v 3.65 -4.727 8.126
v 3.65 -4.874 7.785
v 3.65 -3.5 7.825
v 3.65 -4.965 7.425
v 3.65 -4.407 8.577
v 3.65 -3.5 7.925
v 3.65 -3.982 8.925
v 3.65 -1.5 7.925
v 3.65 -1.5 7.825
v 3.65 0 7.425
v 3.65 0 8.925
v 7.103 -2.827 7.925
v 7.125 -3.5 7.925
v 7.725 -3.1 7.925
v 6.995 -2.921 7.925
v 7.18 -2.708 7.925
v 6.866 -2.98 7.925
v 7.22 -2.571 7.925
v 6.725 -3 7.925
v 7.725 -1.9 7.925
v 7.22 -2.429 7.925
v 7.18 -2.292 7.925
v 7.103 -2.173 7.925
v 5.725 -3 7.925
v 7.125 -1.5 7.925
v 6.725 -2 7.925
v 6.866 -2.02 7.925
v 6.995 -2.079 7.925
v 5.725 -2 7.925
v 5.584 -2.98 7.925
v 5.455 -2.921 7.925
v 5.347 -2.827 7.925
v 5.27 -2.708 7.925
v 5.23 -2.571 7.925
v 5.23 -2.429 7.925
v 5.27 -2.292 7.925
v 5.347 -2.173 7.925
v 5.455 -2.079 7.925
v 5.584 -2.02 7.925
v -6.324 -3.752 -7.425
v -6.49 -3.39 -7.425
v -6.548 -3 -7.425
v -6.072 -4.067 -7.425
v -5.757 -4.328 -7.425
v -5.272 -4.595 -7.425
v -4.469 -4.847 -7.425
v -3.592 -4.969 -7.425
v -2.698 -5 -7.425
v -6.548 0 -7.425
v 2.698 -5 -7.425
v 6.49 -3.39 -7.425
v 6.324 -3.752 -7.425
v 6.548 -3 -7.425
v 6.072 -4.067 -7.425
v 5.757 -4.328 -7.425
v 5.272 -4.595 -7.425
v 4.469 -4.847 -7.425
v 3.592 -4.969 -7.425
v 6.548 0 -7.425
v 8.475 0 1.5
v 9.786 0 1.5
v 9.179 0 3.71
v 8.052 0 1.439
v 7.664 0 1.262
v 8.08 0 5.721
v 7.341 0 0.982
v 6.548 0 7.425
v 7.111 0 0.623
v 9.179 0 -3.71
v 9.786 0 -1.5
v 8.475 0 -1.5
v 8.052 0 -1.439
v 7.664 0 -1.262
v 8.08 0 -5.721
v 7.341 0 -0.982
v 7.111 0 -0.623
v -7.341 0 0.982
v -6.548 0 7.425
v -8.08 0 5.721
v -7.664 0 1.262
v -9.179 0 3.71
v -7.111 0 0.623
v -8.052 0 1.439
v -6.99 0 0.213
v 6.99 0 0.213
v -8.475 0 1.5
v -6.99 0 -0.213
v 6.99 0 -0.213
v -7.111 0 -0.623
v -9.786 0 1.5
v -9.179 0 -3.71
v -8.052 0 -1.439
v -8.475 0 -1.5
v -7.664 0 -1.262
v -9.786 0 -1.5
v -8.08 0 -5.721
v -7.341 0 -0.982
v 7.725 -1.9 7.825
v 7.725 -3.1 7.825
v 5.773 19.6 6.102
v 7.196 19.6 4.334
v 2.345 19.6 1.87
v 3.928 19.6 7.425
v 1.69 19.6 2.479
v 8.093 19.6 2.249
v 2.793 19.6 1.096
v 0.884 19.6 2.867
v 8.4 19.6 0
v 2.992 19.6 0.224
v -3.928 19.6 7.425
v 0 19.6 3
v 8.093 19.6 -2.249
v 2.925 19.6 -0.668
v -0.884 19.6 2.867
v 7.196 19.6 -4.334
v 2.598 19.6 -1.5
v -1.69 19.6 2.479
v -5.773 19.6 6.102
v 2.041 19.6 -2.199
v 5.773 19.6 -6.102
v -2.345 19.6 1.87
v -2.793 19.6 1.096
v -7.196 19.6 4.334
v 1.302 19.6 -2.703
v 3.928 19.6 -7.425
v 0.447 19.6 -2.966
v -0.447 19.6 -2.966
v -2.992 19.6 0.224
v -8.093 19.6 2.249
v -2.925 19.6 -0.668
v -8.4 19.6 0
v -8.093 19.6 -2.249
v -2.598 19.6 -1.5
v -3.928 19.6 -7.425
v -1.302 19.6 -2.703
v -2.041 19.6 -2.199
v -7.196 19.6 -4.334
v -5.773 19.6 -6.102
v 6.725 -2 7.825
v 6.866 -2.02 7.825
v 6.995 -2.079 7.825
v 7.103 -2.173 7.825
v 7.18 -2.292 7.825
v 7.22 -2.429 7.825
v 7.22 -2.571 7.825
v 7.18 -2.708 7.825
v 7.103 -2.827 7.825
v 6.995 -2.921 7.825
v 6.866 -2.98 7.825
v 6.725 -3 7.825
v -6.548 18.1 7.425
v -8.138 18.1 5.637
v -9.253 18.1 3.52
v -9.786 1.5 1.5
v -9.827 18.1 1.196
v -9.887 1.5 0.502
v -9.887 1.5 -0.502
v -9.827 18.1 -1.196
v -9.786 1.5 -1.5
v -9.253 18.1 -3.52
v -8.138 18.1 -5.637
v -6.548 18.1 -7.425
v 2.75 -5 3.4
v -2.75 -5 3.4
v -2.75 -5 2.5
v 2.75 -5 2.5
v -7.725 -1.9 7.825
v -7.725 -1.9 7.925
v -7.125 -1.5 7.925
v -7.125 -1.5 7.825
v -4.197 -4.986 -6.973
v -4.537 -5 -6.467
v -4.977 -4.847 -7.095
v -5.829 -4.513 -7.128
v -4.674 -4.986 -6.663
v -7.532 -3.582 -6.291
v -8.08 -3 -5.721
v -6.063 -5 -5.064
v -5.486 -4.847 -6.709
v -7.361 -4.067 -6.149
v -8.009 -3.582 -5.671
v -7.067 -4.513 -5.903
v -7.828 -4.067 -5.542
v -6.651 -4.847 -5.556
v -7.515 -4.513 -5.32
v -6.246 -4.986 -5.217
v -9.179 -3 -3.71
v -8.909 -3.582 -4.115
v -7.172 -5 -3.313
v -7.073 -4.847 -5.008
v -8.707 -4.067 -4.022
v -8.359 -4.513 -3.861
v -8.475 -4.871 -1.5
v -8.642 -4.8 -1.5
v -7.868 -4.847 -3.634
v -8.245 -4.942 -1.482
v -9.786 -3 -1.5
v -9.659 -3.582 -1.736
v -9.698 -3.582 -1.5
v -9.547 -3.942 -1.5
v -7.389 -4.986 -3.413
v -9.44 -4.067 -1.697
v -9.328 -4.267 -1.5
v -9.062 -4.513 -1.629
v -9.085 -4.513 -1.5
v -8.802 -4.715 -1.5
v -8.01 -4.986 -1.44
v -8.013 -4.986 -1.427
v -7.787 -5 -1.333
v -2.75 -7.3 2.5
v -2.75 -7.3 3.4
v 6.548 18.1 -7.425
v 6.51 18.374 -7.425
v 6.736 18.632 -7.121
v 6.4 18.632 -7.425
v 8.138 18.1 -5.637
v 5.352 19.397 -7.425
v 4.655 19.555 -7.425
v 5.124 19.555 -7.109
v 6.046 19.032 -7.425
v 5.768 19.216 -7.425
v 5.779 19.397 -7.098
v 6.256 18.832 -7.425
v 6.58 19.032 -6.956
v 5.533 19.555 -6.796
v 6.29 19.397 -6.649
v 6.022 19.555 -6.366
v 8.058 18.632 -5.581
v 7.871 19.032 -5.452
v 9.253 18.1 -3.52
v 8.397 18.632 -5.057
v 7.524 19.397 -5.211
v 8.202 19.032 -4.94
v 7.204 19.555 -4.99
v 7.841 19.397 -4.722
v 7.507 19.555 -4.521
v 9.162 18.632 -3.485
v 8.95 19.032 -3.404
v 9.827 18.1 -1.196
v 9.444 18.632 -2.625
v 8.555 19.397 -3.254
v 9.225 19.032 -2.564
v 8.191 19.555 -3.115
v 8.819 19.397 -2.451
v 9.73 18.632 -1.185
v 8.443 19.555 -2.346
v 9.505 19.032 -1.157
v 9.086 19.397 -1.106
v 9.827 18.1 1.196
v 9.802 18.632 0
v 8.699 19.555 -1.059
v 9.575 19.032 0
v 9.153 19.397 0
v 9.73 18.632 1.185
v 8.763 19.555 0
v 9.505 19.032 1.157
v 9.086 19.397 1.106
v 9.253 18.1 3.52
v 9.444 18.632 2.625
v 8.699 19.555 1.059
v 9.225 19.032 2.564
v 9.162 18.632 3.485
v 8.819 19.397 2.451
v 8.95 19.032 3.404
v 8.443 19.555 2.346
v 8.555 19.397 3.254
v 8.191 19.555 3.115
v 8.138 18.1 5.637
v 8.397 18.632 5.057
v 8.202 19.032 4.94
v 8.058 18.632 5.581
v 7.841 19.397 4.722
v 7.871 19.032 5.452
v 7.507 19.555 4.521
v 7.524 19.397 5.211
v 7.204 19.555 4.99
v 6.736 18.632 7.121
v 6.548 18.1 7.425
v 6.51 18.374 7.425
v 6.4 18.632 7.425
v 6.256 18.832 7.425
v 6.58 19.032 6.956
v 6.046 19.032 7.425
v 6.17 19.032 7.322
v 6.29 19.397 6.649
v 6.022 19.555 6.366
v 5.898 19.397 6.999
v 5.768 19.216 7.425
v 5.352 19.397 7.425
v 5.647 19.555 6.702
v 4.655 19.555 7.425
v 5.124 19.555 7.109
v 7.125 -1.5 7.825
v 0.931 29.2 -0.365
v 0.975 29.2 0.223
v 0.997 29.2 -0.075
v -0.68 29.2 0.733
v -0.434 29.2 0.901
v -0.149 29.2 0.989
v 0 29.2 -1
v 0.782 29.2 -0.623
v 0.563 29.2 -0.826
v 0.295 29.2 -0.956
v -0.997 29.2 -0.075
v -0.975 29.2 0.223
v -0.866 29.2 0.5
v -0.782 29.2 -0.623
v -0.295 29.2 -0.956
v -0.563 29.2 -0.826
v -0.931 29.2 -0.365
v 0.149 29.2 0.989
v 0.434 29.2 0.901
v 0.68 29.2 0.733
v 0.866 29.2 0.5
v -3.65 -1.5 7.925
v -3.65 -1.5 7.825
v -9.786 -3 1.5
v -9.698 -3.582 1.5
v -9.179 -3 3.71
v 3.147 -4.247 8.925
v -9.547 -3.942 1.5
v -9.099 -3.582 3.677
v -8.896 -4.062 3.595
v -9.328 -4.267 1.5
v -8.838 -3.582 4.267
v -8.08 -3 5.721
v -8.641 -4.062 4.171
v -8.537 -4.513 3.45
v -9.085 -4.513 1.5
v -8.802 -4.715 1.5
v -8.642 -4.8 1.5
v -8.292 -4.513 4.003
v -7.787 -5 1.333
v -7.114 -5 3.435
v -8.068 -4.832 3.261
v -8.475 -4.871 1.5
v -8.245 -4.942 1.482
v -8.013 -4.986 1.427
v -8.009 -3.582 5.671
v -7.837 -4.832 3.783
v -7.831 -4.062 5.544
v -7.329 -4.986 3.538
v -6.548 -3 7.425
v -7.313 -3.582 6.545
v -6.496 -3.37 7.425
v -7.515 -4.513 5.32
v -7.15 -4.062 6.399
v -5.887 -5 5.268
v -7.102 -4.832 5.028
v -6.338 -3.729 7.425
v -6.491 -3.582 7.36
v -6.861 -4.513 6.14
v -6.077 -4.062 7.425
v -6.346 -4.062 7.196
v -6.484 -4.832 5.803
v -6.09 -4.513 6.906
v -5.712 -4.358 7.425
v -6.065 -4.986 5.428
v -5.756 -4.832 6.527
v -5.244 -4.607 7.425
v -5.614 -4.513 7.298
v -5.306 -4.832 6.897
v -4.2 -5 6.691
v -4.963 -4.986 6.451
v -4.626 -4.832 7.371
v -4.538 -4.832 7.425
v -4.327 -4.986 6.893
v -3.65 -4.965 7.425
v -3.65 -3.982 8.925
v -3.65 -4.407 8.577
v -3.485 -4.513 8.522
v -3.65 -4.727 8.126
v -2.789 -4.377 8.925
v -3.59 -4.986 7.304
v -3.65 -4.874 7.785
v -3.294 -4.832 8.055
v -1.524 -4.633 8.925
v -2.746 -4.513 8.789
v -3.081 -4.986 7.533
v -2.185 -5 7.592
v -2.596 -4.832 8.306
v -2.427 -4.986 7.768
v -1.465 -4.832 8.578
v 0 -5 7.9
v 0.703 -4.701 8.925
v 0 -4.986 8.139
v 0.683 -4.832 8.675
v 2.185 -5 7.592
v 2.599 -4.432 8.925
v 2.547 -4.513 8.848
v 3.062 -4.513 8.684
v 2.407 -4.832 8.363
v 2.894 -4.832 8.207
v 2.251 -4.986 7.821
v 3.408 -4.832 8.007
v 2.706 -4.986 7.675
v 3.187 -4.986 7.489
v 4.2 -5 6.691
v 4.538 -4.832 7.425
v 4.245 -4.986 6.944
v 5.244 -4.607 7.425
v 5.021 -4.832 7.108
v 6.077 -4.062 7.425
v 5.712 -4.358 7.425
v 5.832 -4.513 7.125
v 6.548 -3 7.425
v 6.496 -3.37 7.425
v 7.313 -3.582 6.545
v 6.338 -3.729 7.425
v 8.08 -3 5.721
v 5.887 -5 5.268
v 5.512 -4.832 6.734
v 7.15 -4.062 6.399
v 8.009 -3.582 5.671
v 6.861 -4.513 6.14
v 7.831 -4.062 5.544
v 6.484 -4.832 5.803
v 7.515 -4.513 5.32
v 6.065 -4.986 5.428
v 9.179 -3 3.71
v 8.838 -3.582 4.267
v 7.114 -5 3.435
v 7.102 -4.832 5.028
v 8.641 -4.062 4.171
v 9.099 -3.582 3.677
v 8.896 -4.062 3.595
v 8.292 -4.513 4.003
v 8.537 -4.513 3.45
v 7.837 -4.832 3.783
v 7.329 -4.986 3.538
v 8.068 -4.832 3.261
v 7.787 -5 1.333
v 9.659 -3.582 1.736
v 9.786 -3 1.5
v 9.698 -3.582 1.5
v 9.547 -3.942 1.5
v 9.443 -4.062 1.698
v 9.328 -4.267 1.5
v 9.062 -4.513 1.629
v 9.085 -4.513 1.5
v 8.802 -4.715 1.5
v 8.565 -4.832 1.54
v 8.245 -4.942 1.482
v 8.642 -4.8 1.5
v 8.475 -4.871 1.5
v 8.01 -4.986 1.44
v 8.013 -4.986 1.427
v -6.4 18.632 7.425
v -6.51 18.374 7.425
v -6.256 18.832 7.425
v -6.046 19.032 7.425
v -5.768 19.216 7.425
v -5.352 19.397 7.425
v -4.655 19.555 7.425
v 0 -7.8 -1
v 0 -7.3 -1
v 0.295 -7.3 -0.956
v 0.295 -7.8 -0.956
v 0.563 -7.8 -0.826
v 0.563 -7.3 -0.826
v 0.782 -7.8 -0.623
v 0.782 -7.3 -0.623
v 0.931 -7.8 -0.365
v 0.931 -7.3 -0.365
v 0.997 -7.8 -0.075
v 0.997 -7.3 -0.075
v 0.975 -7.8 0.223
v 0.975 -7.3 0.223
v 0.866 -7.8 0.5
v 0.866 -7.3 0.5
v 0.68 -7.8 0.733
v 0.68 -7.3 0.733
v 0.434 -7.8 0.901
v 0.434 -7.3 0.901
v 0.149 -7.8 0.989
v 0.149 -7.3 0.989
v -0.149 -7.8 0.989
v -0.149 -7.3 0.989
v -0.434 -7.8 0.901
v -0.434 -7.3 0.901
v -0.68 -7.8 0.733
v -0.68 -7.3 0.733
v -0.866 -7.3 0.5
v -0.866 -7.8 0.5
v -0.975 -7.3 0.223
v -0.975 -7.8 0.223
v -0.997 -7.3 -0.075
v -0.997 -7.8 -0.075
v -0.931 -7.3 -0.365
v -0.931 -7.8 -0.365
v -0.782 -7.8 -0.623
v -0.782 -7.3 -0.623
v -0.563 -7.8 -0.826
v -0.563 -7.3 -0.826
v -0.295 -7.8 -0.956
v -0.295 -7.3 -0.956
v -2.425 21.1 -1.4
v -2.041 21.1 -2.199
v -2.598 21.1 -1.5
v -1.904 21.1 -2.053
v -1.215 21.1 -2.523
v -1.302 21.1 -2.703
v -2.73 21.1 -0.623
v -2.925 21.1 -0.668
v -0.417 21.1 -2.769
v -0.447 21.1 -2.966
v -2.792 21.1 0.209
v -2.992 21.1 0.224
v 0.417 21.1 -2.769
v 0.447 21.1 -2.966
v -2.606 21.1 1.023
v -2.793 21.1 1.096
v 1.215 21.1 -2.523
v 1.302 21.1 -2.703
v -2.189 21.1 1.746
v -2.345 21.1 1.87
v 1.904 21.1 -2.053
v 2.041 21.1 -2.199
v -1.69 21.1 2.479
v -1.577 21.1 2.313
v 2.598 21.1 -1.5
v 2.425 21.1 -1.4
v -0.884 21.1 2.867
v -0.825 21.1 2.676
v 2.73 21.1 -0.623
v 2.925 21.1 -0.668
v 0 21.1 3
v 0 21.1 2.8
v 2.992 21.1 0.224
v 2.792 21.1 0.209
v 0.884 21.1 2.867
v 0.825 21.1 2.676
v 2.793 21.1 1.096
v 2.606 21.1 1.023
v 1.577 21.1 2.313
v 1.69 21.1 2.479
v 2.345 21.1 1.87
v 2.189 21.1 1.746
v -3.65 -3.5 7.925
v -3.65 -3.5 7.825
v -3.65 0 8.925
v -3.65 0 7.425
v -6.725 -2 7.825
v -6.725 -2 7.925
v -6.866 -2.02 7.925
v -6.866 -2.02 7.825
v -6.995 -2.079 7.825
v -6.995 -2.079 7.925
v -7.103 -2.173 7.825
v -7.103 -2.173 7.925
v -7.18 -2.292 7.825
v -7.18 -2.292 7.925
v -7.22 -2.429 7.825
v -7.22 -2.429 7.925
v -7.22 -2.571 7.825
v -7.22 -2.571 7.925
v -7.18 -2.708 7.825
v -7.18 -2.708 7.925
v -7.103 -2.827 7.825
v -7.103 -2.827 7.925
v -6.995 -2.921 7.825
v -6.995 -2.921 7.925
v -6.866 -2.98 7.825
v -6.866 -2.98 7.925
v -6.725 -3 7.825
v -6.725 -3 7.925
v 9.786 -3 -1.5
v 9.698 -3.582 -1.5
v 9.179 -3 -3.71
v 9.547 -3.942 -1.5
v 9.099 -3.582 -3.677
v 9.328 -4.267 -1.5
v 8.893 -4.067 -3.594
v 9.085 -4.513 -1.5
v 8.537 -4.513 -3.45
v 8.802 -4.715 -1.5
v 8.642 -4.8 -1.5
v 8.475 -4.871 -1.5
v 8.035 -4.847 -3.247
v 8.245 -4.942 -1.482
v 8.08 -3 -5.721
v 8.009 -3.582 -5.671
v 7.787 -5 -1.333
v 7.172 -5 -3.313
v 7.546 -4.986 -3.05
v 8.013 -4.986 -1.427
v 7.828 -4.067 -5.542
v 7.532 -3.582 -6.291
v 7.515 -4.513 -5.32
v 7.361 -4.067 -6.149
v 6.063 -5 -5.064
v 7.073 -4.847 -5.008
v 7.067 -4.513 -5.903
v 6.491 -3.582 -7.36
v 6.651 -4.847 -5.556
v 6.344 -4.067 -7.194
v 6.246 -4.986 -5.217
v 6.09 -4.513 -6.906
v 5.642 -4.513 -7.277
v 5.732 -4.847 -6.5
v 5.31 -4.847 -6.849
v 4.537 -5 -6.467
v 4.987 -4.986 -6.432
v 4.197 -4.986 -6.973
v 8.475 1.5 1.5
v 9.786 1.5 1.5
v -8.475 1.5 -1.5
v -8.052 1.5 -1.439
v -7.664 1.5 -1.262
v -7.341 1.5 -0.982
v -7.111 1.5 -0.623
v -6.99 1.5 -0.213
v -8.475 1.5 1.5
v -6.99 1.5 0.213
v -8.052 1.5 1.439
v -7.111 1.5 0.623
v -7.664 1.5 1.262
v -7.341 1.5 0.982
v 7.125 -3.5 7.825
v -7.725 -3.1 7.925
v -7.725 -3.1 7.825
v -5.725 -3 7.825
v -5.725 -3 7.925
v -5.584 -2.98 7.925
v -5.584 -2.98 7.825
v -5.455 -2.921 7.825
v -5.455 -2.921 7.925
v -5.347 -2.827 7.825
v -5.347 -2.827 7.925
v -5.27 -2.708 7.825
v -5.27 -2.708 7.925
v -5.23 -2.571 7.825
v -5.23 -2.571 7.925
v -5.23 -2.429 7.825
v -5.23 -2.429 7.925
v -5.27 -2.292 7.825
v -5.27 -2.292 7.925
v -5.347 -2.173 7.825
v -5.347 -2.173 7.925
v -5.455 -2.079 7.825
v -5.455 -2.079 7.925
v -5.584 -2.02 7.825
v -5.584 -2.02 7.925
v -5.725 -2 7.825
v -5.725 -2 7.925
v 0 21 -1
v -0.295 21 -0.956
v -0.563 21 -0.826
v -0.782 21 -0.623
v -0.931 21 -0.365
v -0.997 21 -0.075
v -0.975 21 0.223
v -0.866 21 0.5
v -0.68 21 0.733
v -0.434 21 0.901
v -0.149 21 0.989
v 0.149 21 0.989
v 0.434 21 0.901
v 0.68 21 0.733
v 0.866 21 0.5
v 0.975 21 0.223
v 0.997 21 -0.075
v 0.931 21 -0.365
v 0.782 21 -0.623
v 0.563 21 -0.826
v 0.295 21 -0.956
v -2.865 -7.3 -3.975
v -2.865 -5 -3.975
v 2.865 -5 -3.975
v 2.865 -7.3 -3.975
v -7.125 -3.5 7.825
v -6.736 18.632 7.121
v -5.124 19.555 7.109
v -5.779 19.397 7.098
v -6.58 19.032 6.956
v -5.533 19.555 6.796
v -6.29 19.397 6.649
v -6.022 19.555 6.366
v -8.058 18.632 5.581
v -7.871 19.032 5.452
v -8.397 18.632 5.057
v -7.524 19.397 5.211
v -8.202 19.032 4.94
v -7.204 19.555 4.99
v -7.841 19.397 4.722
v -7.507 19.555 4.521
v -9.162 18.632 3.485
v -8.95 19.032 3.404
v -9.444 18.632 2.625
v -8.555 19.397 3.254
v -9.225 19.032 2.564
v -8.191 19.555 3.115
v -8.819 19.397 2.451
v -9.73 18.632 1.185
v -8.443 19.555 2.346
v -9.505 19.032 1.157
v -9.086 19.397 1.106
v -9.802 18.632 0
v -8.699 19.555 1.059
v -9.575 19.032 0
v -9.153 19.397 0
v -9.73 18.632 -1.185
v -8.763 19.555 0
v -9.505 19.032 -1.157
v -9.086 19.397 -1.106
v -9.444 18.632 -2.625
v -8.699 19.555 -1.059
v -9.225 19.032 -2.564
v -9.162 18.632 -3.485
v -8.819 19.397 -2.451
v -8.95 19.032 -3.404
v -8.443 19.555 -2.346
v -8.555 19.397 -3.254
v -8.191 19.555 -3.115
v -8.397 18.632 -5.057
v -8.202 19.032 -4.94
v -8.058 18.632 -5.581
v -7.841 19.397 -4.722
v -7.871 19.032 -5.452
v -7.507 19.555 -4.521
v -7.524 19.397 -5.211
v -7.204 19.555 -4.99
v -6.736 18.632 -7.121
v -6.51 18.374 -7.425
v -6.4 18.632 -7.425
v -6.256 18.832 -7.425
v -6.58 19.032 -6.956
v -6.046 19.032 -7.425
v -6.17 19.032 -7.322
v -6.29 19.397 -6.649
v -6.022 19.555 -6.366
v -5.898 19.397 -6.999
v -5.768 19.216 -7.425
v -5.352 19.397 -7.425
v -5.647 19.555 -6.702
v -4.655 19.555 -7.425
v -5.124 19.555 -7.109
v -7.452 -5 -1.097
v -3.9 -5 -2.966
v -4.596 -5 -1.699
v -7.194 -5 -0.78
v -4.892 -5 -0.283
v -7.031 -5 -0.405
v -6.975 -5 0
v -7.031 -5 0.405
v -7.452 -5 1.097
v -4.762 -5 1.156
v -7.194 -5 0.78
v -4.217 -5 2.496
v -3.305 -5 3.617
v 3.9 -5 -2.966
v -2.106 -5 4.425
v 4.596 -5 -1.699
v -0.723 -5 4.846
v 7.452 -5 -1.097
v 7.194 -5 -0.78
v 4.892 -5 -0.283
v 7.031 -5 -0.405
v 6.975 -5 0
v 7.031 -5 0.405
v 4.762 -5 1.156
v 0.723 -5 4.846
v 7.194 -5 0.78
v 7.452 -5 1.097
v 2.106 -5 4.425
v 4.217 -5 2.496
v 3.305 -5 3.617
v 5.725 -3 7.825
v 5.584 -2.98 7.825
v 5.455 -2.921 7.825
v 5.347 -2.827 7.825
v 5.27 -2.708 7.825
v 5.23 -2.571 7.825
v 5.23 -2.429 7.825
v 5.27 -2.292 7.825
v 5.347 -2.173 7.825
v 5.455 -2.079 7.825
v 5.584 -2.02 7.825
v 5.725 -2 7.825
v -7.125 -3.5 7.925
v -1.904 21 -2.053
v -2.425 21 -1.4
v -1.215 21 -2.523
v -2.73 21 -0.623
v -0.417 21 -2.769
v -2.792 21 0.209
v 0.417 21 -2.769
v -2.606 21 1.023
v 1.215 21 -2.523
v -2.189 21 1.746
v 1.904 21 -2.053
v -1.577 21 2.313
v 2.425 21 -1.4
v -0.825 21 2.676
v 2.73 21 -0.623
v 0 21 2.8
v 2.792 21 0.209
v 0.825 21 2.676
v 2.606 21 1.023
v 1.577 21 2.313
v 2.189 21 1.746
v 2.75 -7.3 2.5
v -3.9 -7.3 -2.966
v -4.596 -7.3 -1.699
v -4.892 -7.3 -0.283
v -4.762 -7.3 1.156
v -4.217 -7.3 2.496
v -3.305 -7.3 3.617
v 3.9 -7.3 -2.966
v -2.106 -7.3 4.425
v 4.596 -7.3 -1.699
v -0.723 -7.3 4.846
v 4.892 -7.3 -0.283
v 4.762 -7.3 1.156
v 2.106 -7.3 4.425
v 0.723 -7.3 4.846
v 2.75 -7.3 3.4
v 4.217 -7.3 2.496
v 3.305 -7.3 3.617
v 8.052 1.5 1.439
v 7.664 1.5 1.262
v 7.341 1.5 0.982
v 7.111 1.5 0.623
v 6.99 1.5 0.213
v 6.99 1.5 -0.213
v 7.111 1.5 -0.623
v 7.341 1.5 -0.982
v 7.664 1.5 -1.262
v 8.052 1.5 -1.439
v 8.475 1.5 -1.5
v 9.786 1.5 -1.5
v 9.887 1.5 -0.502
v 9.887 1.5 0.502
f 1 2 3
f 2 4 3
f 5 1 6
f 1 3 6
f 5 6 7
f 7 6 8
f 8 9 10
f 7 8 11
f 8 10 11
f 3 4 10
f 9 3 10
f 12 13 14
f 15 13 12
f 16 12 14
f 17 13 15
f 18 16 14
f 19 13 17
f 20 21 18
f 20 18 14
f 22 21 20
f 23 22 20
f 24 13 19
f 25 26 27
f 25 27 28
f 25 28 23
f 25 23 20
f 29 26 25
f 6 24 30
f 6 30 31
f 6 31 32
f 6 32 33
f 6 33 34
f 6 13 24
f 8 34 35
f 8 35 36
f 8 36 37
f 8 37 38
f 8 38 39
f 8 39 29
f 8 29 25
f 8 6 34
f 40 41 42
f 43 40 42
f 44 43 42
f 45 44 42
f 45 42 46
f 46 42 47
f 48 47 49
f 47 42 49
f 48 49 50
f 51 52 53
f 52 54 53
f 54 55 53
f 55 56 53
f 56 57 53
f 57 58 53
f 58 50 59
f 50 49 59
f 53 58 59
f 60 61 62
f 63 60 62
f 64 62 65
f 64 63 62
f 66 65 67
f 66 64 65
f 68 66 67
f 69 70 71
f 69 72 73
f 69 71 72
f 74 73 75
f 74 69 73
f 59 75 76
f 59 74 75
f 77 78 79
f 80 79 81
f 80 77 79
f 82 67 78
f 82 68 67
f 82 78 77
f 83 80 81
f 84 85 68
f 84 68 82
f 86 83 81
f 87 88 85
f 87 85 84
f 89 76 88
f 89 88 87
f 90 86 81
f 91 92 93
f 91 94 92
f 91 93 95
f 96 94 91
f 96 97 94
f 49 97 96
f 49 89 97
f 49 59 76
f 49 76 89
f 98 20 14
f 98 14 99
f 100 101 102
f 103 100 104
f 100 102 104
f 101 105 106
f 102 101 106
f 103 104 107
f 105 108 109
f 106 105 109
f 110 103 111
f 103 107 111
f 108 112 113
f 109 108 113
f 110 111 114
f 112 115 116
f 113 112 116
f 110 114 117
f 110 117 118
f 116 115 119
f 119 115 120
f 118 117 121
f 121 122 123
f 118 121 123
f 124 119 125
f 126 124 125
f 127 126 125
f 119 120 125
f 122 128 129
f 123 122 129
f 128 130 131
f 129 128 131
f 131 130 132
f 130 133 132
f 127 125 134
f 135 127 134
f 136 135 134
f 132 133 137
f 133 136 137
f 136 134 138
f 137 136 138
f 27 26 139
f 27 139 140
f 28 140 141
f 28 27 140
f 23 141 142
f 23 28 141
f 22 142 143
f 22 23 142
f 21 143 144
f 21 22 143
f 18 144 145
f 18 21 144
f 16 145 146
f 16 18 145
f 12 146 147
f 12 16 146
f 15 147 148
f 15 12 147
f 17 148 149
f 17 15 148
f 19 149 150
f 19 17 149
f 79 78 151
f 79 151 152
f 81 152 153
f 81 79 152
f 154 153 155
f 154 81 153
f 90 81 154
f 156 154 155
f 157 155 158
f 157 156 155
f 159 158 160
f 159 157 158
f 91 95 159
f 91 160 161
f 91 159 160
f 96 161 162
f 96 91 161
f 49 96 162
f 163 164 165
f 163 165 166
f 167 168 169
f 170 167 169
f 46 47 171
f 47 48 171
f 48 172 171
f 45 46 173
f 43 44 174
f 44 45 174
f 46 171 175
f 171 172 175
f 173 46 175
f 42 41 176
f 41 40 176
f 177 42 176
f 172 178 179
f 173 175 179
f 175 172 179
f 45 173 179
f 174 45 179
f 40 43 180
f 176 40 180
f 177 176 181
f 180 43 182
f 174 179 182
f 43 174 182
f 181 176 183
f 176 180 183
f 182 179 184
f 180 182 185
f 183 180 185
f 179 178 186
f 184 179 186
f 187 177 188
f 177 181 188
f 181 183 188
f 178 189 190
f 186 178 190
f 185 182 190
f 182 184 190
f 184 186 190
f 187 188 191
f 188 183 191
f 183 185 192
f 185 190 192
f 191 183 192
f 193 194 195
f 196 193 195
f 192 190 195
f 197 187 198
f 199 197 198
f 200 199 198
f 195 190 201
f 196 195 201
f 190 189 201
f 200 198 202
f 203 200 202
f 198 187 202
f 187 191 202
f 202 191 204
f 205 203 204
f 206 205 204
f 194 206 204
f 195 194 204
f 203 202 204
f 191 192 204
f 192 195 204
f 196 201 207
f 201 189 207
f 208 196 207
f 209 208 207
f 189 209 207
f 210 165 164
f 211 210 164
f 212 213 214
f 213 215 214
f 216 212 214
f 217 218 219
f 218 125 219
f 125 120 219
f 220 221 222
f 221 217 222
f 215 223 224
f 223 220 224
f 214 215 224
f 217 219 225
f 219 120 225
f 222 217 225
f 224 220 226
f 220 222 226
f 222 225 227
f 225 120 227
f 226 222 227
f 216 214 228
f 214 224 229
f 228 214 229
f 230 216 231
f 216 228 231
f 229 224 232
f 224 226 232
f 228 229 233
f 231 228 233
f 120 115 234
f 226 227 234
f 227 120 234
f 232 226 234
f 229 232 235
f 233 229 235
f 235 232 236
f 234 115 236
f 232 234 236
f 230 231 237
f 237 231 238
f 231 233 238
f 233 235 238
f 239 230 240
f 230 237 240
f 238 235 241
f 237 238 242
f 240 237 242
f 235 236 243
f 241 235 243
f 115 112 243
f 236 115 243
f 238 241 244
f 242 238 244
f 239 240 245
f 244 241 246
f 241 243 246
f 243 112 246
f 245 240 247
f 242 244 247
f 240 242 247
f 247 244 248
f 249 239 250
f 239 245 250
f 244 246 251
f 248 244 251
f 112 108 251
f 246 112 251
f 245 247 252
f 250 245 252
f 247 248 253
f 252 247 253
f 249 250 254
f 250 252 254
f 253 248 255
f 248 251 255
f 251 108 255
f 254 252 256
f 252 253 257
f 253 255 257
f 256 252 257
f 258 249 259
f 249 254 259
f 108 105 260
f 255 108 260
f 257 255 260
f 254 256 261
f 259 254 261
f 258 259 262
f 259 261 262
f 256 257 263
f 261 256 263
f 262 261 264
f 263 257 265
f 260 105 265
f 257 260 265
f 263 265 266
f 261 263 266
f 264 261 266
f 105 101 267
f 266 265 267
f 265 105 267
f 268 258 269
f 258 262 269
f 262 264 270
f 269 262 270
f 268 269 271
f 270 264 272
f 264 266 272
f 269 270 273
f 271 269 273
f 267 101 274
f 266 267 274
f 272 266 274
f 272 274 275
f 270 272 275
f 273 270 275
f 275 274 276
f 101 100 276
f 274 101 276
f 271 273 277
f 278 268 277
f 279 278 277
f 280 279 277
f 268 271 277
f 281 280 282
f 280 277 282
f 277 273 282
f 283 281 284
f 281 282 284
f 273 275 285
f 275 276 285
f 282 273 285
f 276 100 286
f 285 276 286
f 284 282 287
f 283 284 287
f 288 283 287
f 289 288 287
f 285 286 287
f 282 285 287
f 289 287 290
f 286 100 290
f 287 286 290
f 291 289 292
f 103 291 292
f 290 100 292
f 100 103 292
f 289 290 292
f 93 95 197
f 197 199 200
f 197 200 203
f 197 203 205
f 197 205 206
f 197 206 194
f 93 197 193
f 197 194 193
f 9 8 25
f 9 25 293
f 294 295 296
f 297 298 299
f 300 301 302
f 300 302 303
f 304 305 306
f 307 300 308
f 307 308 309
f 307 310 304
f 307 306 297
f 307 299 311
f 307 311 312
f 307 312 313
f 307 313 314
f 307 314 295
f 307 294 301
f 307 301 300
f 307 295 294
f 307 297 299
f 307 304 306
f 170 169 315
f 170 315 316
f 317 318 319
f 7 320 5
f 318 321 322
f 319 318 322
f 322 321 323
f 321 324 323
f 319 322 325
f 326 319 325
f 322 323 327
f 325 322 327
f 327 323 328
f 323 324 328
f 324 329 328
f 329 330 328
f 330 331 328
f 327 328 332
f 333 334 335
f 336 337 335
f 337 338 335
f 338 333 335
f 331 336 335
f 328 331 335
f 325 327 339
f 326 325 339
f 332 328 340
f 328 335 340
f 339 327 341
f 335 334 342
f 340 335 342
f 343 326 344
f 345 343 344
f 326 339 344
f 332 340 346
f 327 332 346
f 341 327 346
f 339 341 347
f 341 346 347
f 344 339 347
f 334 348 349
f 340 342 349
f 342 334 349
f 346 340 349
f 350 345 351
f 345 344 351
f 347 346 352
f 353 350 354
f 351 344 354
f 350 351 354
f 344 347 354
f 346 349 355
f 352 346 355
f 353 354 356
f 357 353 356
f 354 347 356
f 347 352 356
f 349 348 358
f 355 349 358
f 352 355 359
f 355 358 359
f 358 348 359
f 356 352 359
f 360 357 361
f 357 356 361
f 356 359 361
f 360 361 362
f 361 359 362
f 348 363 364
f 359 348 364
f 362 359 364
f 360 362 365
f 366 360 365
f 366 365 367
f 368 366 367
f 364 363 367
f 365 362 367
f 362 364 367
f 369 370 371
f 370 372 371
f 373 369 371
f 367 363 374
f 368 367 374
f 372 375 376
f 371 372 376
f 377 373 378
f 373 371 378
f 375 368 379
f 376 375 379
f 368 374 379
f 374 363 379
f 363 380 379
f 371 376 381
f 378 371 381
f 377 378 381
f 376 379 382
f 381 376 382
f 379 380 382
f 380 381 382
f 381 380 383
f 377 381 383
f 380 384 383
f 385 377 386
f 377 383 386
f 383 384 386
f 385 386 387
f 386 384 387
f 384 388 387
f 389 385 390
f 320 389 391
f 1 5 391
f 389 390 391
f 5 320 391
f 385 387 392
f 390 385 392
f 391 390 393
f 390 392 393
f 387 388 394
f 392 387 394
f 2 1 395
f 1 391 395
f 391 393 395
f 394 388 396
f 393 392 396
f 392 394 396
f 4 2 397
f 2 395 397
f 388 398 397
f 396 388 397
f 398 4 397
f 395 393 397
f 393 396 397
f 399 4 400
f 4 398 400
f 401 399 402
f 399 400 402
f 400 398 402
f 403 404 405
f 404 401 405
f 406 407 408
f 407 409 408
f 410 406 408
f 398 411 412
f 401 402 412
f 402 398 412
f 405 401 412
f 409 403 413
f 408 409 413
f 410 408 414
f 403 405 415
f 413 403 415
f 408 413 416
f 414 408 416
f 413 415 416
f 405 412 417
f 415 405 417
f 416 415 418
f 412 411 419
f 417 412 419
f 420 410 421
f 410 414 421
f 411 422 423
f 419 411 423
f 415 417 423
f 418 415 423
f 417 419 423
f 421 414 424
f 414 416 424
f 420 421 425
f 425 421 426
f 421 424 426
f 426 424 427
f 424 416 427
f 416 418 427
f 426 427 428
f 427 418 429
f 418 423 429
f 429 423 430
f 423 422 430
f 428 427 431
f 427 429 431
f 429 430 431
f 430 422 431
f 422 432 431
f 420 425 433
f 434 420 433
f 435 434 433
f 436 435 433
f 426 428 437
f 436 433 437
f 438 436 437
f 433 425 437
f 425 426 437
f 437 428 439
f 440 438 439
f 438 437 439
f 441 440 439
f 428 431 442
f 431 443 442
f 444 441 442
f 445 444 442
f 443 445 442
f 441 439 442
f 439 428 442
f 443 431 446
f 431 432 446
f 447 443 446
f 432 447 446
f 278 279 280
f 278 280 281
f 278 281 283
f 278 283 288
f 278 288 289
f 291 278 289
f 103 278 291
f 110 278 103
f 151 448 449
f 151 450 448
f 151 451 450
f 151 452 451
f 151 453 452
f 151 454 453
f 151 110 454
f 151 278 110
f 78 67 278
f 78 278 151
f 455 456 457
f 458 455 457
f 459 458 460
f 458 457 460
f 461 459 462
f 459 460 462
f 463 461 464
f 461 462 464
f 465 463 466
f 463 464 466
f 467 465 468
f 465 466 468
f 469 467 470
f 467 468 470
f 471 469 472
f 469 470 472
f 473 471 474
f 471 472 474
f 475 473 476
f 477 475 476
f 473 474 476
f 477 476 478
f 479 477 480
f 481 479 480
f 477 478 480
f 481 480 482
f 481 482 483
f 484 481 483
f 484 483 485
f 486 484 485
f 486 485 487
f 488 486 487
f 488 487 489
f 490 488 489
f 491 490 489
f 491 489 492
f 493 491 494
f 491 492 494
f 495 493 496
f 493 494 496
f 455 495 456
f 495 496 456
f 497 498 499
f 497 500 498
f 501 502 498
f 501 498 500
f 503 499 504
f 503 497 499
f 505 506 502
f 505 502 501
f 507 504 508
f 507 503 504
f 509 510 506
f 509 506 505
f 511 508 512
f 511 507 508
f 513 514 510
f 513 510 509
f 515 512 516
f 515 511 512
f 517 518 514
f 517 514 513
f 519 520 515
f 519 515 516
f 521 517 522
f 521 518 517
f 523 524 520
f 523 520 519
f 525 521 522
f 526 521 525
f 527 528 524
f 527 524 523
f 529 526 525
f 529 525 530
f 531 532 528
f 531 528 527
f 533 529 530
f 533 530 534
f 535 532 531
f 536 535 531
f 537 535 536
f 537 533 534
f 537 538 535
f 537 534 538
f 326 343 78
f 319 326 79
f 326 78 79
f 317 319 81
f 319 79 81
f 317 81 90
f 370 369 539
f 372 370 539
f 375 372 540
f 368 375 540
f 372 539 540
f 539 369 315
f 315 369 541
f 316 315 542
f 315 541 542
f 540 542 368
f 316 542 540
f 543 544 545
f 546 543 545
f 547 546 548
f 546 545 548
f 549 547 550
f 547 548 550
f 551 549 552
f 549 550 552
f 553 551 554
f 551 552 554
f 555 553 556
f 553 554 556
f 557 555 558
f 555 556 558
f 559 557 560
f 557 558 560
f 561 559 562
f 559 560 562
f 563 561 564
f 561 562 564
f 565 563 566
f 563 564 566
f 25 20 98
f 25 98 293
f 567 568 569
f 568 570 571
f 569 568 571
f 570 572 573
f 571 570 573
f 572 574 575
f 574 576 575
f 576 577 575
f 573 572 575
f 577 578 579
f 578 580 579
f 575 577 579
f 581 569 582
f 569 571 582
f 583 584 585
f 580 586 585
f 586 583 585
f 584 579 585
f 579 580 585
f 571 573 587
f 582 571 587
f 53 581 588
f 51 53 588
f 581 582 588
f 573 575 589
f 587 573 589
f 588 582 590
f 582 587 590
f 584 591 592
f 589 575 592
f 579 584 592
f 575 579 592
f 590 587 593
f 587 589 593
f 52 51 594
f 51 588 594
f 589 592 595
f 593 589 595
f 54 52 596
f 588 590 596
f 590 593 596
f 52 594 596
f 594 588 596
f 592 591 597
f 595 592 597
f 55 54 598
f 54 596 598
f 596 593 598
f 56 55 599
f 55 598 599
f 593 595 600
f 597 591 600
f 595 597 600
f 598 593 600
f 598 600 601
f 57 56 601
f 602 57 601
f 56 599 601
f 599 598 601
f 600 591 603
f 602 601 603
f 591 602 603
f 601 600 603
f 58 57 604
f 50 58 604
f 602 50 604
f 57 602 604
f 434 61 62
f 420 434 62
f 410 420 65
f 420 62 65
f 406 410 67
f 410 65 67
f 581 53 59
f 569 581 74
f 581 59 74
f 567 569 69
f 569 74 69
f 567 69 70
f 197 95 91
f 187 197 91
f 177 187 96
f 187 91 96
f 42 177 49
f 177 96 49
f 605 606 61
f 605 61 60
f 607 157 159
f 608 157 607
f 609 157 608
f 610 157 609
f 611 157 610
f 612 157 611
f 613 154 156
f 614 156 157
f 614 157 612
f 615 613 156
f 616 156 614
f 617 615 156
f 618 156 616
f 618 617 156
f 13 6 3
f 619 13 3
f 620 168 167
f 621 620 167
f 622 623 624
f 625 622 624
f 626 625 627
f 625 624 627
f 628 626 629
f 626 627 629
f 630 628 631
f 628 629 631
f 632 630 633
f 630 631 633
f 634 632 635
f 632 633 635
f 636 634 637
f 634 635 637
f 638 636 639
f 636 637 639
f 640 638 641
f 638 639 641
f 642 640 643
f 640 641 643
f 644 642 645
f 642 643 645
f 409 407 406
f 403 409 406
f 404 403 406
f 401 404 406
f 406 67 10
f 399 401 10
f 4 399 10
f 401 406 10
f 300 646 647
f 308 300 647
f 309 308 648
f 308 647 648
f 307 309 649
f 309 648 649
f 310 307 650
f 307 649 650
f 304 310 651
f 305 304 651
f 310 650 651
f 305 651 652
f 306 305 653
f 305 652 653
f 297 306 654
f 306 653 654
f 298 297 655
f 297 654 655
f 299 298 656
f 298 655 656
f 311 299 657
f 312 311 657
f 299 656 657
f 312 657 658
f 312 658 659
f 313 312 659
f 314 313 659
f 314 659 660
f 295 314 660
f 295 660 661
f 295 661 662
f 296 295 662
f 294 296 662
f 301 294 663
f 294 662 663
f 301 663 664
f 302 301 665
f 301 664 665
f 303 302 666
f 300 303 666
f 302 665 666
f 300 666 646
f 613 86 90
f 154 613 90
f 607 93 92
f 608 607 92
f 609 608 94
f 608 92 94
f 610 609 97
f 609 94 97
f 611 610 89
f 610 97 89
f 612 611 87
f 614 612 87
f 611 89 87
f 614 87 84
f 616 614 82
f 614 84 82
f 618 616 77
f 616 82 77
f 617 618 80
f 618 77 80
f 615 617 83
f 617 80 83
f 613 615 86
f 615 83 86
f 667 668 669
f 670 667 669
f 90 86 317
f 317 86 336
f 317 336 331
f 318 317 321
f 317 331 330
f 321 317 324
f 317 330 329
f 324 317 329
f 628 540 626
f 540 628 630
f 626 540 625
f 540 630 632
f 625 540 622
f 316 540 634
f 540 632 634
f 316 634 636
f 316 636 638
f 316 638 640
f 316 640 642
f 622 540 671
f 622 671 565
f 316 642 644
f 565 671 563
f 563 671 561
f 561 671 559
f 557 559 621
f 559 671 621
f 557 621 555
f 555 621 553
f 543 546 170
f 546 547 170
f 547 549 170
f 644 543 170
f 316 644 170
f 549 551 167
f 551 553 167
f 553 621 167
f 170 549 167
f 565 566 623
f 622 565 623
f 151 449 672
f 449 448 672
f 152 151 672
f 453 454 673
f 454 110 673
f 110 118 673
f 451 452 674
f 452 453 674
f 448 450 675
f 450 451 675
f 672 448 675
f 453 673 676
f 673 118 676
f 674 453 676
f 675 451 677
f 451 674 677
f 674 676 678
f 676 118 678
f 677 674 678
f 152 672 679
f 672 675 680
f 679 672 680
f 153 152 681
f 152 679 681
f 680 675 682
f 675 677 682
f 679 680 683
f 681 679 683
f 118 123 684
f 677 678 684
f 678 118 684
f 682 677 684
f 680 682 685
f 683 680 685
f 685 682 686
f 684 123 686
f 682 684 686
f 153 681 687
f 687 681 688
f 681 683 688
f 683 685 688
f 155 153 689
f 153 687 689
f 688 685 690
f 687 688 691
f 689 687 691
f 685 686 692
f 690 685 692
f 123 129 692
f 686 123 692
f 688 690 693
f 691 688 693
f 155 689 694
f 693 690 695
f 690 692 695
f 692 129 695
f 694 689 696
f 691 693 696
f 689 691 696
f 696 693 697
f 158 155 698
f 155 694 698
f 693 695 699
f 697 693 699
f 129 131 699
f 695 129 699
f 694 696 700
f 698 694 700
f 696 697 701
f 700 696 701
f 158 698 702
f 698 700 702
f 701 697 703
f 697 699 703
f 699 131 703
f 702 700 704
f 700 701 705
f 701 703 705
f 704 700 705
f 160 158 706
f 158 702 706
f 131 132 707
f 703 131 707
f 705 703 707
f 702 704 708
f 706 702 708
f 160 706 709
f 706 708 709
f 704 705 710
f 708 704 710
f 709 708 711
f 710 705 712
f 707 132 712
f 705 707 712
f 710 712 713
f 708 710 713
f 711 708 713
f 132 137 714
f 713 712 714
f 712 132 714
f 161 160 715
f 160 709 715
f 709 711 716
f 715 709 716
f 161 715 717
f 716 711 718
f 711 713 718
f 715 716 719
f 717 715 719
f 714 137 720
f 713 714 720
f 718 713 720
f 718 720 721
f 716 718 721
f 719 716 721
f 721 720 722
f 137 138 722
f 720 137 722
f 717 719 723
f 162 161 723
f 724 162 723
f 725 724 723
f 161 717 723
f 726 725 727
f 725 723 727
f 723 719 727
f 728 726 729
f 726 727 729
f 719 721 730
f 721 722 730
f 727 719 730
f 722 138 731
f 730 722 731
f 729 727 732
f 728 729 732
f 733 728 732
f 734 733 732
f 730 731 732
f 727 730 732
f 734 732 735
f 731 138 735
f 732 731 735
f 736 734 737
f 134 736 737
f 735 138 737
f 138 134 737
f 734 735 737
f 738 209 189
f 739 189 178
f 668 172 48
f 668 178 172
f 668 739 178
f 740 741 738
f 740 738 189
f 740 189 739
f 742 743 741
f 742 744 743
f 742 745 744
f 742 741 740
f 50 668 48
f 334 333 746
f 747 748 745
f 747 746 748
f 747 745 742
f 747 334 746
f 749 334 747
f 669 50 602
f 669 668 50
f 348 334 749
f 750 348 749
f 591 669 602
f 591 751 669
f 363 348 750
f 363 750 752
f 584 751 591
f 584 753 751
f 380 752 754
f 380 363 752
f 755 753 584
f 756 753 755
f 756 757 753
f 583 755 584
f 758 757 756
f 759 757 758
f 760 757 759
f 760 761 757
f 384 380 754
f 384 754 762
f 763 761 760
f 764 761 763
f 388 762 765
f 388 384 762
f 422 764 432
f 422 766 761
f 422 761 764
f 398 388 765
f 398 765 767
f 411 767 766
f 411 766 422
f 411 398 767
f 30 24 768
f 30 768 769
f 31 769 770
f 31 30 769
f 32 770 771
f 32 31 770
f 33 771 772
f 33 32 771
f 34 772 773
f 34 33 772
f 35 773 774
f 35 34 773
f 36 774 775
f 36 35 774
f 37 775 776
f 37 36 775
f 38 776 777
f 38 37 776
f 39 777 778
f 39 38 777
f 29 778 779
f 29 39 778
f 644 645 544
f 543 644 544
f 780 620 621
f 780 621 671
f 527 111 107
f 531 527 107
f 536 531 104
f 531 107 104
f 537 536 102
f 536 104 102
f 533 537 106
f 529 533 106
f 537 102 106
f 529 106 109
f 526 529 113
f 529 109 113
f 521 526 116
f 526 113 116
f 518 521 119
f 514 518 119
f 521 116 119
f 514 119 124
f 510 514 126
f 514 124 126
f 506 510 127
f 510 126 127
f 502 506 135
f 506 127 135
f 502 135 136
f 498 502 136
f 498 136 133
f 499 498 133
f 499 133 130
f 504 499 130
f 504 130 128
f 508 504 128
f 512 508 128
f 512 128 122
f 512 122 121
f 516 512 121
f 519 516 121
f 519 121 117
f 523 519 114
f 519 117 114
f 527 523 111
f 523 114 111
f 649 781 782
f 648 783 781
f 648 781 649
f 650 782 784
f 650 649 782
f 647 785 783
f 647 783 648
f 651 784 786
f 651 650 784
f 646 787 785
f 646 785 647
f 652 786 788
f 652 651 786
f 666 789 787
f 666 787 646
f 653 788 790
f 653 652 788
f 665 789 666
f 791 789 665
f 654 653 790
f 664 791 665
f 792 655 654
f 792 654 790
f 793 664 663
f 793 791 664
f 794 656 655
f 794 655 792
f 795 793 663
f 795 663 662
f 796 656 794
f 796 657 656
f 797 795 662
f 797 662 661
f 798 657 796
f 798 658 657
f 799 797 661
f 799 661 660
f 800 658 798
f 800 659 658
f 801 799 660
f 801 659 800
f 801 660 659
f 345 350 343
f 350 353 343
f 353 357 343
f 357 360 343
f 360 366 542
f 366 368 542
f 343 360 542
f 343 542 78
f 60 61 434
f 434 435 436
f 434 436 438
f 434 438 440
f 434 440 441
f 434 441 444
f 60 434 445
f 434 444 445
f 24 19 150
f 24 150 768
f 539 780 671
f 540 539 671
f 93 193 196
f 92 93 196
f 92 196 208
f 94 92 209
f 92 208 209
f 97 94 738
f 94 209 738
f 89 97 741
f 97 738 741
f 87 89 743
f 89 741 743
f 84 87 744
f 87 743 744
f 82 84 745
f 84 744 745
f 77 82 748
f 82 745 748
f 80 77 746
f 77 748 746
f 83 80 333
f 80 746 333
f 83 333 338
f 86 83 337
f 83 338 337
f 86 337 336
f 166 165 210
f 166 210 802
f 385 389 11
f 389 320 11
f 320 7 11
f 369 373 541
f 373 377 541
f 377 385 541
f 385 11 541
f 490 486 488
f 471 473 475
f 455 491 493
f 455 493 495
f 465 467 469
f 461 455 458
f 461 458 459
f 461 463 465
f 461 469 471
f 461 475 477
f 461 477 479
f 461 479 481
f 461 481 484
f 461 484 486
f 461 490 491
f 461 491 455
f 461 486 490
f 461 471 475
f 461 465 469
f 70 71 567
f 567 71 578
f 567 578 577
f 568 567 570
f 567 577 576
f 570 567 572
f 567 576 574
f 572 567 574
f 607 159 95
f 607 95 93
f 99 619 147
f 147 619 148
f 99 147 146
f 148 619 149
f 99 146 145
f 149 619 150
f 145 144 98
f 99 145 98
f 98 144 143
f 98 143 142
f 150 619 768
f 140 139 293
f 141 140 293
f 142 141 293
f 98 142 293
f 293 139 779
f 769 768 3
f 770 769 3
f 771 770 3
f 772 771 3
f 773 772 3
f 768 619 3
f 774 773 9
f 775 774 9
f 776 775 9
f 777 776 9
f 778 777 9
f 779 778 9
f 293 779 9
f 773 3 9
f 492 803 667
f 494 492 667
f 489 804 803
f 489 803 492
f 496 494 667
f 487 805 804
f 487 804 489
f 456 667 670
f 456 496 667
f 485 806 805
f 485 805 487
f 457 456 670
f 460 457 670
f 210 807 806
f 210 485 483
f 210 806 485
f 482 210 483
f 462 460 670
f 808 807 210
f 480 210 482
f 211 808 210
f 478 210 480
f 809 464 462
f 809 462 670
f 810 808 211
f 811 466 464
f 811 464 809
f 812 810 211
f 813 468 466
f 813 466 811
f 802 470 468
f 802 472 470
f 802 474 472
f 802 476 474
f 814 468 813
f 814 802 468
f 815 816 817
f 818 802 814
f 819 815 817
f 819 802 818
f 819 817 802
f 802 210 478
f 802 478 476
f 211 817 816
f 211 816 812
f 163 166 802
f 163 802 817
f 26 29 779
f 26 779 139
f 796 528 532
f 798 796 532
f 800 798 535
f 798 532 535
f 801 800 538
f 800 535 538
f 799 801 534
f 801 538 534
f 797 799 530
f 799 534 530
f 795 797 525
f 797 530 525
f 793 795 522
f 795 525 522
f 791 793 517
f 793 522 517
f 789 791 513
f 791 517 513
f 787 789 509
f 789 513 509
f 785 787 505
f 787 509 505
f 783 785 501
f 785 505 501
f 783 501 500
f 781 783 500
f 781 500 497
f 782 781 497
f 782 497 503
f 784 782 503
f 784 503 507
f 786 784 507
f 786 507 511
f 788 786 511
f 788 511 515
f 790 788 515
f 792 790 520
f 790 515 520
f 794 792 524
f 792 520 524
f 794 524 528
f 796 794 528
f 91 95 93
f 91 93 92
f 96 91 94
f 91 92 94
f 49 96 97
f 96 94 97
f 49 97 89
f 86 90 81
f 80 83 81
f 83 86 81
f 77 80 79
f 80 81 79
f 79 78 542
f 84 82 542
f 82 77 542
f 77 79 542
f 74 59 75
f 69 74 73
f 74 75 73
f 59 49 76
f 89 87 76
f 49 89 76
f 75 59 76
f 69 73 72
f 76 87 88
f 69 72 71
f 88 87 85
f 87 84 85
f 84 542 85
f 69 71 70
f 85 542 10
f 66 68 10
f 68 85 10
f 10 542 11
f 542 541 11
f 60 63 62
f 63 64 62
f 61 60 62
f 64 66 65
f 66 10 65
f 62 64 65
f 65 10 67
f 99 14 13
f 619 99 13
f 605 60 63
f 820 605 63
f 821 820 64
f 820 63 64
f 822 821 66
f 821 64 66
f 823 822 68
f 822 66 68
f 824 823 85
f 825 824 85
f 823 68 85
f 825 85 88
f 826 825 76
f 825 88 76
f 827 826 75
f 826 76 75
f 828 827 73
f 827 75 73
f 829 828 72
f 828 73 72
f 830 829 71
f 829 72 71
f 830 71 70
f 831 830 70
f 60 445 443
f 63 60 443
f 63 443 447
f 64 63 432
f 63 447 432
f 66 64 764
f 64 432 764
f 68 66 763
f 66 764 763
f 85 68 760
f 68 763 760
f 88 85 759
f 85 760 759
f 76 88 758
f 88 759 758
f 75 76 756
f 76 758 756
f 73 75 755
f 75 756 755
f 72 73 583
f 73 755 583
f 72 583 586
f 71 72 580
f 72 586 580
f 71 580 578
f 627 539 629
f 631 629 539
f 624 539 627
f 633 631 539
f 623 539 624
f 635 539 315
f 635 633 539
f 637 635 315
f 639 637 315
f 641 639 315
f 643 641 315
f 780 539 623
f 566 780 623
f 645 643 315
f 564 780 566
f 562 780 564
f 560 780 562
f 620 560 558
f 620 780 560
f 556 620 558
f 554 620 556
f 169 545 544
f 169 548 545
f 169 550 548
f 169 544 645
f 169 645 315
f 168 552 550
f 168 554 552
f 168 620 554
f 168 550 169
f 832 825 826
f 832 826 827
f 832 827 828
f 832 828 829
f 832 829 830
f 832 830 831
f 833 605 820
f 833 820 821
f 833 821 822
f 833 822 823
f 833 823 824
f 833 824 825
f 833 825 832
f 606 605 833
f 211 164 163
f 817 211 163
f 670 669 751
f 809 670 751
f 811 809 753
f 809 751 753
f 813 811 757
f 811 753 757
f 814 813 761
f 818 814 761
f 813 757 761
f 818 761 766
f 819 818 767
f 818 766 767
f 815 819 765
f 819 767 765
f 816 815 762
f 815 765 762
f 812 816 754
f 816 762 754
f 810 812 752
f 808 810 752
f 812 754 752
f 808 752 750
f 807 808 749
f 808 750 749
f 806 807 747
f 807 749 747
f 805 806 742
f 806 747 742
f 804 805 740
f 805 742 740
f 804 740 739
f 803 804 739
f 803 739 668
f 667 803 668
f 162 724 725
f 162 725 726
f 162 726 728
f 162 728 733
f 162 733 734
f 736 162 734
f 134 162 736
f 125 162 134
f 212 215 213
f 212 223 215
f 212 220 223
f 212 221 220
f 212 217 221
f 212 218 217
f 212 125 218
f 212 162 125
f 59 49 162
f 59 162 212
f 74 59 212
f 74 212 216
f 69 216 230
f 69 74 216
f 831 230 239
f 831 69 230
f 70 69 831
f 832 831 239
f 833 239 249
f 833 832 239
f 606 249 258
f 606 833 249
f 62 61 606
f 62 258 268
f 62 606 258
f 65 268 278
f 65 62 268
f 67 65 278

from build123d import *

# Parameters (mm, degrees)
BOSS_EXTRUDE1_DEPTH      = 19.6
BOSS_EXTRUDE2_DEPTH      = 5
SKETCH3_W                = 5.5
SKETCH3_H                = 0.9
BOSS_EXTRUDE3_DEPTH      = 2.3
SKETCH4_R                = 1
BOSS_EXTRUDE4_DEPTH      = 0.5
CUT_EXTRUDE1_DEPTH       = 6.5
BOSS_EXTRUDE5_DEPTH      = 7.725
BOSS_EXTRUDE5_DEPTH_BACK = 7.725
SKETCH7_W                = 0.1
SKETCH7_H                = 2
CUT_EXTRUDE2_DEPTH       = 0.1
SKETCH9_R                = 3
BOSS_EXTRUDE6_DEPTH      = 1.5
SKETCH10_R               = 2.8
CUT_EXTRUDE3_DEPTH       = 0.1
SKETCH11_R               = 1
BOSS_EXTRUDE7_DEPTH      = 8.2
FILLET2_R                = 1.5


with BuildPart() as part:
    # Sketch1 → Boss-Extrude1 (new body)
    with BuildSketch(Plane(origin=(0, 0, 0), x_dir=(1, 0, 0), z_dir=(0, 1, 0))):
        with BuildLine():
            Line((-6.548234495, 7.425), (6.548234495, 7.425))
            ThreePointArc((6.548234495, 7.425), (9.9, 0), (6.548234495, -7.425))
            Line((6.548234495, -7.425), (-6.548234495, -7.425))
            ThreePointArc((-6.548234495, -7.425), (-9.9, 0), (-6.548234495, 7.425))
        make_face()
    extrude(amount=BOSS_EXTRUDE1_DEPTH)


with BuildPart() as body_2:
    # Sketch2 → Boss-Extrude2 (new body)
    with BuildSketch(Plane.XZ):
        with BuildLine():
            Line((-6.548234495, -7.425), (6.548234495, -7.425))
            ThreePointArc((6.548234495, -7.425), (9.9, 0), (6.548234495, 7.425))
            Line((6.548234495, 7.425), (3.65, 7.425))
            Line((3.65, 7.425), (3.65, 8.925))
            Line((3.65, 8.925), (-3.65, 8.925))
            Line((-3.65, 8.925), (-3.65, 7.425))
            Line((-3.65, 7.425), (-6.548234495, 7.425))
            ThreePointArc((-6.548234495, 7.425), (-9.9, 0), (-6.548234495, -7.425))
        make_face()
    extrude(amount=BOSS_EXTRUDE2_DEPTH)

    # Sketch3 → Boss-Extrude3 (add)
    with BuildSketch(Plane.XZ.offset(5)):
        with BuildLine():
            Line((-2.865200691, -3.975), (2.865200691, -3.975))
            ThreePointArc((2.865200691, -3.975), (0, 4.9), (-2.865200691, -3.975))
        make_face()
        with Locations((0, 2.95)):
            Rectangle(SKETCH3_W, SKETCH3_H, mode=Mode.SUBTRACT)
    extrude(amount=BOSS_EXTRUDE3_DEPTH)

    # Sketch4 → Boss-Extrude4 (add)
    with BuildSketch(Plane.XZ.offset(7.3)):
        with Locations(Location((0, 0, 0), (0, 0, 270))):
            Circle(SKETCH4_R)
    extrude(amount=BOSS_EXTRUDE4_DEPTH)


with BuildPart() as cut_extrude1_tool:
    # Sketch5 → Cut-Extrude1 (new body)
    with BuildSketch(Plane.XZ.offset(5)):
        with BuildLine():
            ThreePointArc((-8.475, -1.5), (-6.975, 0), (-8.475, 1.5))
            Line((-8.475, 1.5), (-9.785703858, 1.5))
            ThreePointArc((-9.785703858, 1.5), (-9.9, 0), (-9.785703858, -1.5))
            Line((-9.785703858, -1.5), (-8.475, -1.5))
        make_face()
        with BuildLine():
            Line((9.785703858, 1.5), (8.475, 1.5))
            ThreePointArc((8.475, 1.5), (6.975, 0), (8.475, -1.5))
            Line((8.475, -1.5), (9.785703858, -1.5))
            ThreePointArc((9.785703858, -1.5), (9.9, 0), (9.785703858, 1.5))
        make_face()
    extrude(amount=-CUT_EXTRUDE1_DEPTH)


with BuildPart() as part_1:
    add(part.part)

    # Cut-Extrude1: cut by cut_extrude1_tool
    add(cut_extrude1_tool.part, mode=Mode.SUBTRACT)

    # Sketch9 → Boss-Extrude6 (add)
    with BuildSketch(Plane(origin=(0, 19.6, 0), x_dir=(1, 0, 0), z_dir=(0, 1, 0))):
        with Locations(Location((0, 0, 0), (0, 0, 270))):
            Circle(SKETCH9_R)
    extrude(amount=BOSS_EXTRUDE6_DEPTH)

    # Sketch10 → Cut-Extrude3 (cut)
    with BuildSketch(Plane(origin=(0, 21.1, 0), x_dir=(1, 0, 0), z_dir=(0, 1, 0))):
        with Locations(Location((0, 0, 0), (0, 0, 270))):
            Circle(SKETCH10_R)
    extrude(amount=-CUT_EXTRUDE3_DEPTH, mode=Mode.SUBTRACT)

    # Sketch11 → Boss-Extrude7 (add)
    with BuildSketch(Plane(origin=(0, 21, 0), x_dir=(1, 0, 0), z_dir=(0, 1, 0))):
        with Locations(Location((0, 0, 0), (0, 0, 90))):
            Circle(SKETCH11_R)
    extrude(amount=BOSS_EXTRUDE7_DEPTH)

    # Fillet2
    fillet2_edges = [part_1.edges().sort_by_distance(p)[0] for p in [
        (9.9, 19.6, 0),
        (-9.9, 19.6, 0),
    ]]
    fillet(fillet2_edges, radius=FILLET2_R)


with BuildPart() as body_2_1:
    add(body_2.part)

    # Cut-Extrude1: cut by cut_extrude1_tool
    add(cut_extrude1_tool.part, mode=Mode.SUBTRACT)

    # Fillet1: read off the stored shape, not the designer's step
    # Fillet1 outline → Fillet1 (revolve, cut)
    with BuildSketch(Plane.XY):
        with BuildLine():
            ThreePointArc((9.9, -3), (9.314213562, -4.414213562), (7.9, -5))
            Line((7.9, -5), (9.9, -5))
            Line((9.9, -5), (9.9, -3))
        make_face()
    revolve(axis=Axis((0, 0, 0), (0, 1, 0)), mode=Mode.SUBTRACT)

    # Sketch7 → Boss-Extrude5 (add, two sides: drawn at the far end of the back side and taken through both)
    with BuildSketch(Plane(origin=(0, 0, 0), x_dir=(0, 0, -1), z_dir=(1, 0, 0)).offset(-BOSS_EXTRUDE5_DEPTH_BACK)):
        with Locations((-7.875, -2.5)):
            Rectangle(SKETCH7_W, SKETCH7_H)
    extrude(amount=BOSS_EXTRUDE5_DEPTH + BOSS_EXTRUDE5_DEPTH_BACK)

    # Sketch8 → Cut-Extrude2 (cut)
    with BuildSketch(Plane.XY.offset(7.925)):
        with BuildLine():
            Line((6.725, -3), (5.725, -3))
            ThreePointArc((5.725, -3), (5.225, -2.5), (5.725, -2))
            Line((5.725, -2), (6.725, -2))
            ThreePointArc((6.725, -2), (7.225, -2.5), (6.725, -3))
        make_face()
        Polygon((7.725, -1.9), (7.125, -1.5), (7.725, -1.5), align=None)
        Polygon((7.725, -3.5), (7.725, -3.1), (7.125, -3.5), align=None)
        with BuildLine():
            Line((-6.725, -3), (-5.725, -3))
            ThreePointArc((-5.725, -3), (-5.225, -2.5), (-5.725, -2))
            Line((-5.725, -2), (-6.725, -2))
            ThreePointArc((-6.725, -2), (-7.225, -2.5), (-6.725, -3))
        make_face()
        Polygon((-7.725, -3.1), (-7.125, -3.5), (-7.725, -3.5), align=None)
        Polygon((-7.725, -1.5), (-7.725, -1.9), (-7.125, -1.5), align=None)
    extrude(amount=-CUT_EXTRUDE2_DEPTH, mode=Mode.SUBTRACT)


solid = Compound([part_1.part, body_2_1.part])
